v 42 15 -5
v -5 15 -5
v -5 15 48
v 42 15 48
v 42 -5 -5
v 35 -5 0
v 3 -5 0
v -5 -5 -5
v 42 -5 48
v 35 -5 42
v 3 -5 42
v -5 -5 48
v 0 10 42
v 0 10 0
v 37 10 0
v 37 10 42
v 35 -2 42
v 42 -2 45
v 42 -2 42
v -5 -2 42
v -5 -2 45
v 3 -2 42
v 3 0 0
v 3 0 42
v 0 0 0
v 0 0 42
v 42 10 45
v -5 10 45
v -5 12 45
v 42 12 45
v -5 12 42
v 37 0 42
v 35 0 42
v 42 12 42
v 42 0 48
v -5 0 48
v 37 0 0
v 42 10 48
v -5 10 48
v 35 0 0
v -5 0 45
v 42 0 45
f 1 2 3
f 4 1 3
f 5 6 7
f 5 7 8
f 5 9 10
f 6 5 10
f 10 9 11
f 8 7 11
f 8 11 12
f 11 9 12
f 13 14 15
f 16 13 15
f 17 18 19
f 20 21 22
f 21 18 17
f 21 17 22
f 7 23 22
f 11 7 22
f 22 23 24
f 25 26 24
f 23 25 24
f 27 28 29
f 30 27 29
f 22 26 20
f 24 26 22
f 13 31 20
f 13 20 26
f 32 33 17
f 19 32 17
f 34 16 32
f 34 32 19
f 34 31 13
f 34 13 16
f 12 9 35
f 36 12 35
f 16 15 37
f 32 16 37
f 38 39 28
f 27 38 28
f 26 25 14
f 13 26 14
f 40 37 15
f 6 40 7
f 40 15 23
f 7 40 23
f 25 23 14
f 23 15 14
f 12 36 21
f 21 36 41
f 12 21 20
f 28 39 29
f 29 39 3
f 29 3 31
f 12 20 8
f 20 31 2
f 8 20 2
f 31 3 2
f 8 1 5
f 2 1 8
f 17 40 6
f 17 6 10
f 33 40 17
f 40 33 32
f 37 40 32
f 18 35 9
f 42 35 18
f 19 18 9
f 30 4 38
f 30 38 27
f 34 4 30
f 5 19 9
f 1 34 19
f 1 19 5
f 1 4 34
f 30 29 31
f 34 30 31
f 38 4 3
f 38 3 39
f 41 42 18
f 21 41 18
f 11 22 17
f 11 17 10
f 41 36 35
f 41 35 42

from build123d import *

# Parameters (mm, degrees)
EXTRUDE_1_DEPTH = 42
SKETCH_2_W      = 8
SKETCH_2_H      = 42
SKETCH_2_W_2    = 7
EXTRUDE_2_DEPTH = 5
SKETCH_3_W      = 47
SKETCH_3_H      = 20
EXTRUDE_3_DEPTH = 5
EXTRUDE_4_DEPTH = 47


with BuildPart() as part:
    # 스케치1 → 보스-돌출1 (new body)
    with BuildSketch(Plane.XY):
        Polygon((-5, 0), (0, 0), (0, 10), (37, 10), (37, 0), (42, 0), (42, 15), (-5, 15), align=None)
    extrude(amount=EXTRUDE_1_DEPTH)

    # 스케치2 → 보스-돌출2 (add)
    with BuildSketch(Plane.XZ):
        with Locations((-1, 21)):
            Rectangle(SKETCH_2_W, SKETCH_2_H)
        with Locations((38.5, 21)):
            Rectangle(SKETCH_2_W_2, SKETCH_2_H)
    extrude(amount=EXTRUDE_2_DEPTH)

    # 스케치3 → 보스-돌출3 (add)
    with BuildSketch(Plane(origin=(0, 0, 0), x_dir=(-1, 0, 0), z_dir=(0, 0, -1))):
        with Locations((-18.5, 5)):
            Rectangle(SKETCH_3_W, SKETCH_3_H)
    extrude(amount=EXTRUDE_3_DEPTH)

    # 스케치4 → 보스-돌출4 (add)
    with BuildSketch(Plane.ZY.offset(5)):
        Polygon((42, 15), (48, 15), (48, 10), (45, 10), (45, 12), (42, 12), align=None)
        Polygon((42, -5), (48, -5), (48, 0), (45, 0), (45, -2), (42, -2), align=None)
    extrude(amount=-EXTRUDE_4_DEPTH)


solid = part.part
